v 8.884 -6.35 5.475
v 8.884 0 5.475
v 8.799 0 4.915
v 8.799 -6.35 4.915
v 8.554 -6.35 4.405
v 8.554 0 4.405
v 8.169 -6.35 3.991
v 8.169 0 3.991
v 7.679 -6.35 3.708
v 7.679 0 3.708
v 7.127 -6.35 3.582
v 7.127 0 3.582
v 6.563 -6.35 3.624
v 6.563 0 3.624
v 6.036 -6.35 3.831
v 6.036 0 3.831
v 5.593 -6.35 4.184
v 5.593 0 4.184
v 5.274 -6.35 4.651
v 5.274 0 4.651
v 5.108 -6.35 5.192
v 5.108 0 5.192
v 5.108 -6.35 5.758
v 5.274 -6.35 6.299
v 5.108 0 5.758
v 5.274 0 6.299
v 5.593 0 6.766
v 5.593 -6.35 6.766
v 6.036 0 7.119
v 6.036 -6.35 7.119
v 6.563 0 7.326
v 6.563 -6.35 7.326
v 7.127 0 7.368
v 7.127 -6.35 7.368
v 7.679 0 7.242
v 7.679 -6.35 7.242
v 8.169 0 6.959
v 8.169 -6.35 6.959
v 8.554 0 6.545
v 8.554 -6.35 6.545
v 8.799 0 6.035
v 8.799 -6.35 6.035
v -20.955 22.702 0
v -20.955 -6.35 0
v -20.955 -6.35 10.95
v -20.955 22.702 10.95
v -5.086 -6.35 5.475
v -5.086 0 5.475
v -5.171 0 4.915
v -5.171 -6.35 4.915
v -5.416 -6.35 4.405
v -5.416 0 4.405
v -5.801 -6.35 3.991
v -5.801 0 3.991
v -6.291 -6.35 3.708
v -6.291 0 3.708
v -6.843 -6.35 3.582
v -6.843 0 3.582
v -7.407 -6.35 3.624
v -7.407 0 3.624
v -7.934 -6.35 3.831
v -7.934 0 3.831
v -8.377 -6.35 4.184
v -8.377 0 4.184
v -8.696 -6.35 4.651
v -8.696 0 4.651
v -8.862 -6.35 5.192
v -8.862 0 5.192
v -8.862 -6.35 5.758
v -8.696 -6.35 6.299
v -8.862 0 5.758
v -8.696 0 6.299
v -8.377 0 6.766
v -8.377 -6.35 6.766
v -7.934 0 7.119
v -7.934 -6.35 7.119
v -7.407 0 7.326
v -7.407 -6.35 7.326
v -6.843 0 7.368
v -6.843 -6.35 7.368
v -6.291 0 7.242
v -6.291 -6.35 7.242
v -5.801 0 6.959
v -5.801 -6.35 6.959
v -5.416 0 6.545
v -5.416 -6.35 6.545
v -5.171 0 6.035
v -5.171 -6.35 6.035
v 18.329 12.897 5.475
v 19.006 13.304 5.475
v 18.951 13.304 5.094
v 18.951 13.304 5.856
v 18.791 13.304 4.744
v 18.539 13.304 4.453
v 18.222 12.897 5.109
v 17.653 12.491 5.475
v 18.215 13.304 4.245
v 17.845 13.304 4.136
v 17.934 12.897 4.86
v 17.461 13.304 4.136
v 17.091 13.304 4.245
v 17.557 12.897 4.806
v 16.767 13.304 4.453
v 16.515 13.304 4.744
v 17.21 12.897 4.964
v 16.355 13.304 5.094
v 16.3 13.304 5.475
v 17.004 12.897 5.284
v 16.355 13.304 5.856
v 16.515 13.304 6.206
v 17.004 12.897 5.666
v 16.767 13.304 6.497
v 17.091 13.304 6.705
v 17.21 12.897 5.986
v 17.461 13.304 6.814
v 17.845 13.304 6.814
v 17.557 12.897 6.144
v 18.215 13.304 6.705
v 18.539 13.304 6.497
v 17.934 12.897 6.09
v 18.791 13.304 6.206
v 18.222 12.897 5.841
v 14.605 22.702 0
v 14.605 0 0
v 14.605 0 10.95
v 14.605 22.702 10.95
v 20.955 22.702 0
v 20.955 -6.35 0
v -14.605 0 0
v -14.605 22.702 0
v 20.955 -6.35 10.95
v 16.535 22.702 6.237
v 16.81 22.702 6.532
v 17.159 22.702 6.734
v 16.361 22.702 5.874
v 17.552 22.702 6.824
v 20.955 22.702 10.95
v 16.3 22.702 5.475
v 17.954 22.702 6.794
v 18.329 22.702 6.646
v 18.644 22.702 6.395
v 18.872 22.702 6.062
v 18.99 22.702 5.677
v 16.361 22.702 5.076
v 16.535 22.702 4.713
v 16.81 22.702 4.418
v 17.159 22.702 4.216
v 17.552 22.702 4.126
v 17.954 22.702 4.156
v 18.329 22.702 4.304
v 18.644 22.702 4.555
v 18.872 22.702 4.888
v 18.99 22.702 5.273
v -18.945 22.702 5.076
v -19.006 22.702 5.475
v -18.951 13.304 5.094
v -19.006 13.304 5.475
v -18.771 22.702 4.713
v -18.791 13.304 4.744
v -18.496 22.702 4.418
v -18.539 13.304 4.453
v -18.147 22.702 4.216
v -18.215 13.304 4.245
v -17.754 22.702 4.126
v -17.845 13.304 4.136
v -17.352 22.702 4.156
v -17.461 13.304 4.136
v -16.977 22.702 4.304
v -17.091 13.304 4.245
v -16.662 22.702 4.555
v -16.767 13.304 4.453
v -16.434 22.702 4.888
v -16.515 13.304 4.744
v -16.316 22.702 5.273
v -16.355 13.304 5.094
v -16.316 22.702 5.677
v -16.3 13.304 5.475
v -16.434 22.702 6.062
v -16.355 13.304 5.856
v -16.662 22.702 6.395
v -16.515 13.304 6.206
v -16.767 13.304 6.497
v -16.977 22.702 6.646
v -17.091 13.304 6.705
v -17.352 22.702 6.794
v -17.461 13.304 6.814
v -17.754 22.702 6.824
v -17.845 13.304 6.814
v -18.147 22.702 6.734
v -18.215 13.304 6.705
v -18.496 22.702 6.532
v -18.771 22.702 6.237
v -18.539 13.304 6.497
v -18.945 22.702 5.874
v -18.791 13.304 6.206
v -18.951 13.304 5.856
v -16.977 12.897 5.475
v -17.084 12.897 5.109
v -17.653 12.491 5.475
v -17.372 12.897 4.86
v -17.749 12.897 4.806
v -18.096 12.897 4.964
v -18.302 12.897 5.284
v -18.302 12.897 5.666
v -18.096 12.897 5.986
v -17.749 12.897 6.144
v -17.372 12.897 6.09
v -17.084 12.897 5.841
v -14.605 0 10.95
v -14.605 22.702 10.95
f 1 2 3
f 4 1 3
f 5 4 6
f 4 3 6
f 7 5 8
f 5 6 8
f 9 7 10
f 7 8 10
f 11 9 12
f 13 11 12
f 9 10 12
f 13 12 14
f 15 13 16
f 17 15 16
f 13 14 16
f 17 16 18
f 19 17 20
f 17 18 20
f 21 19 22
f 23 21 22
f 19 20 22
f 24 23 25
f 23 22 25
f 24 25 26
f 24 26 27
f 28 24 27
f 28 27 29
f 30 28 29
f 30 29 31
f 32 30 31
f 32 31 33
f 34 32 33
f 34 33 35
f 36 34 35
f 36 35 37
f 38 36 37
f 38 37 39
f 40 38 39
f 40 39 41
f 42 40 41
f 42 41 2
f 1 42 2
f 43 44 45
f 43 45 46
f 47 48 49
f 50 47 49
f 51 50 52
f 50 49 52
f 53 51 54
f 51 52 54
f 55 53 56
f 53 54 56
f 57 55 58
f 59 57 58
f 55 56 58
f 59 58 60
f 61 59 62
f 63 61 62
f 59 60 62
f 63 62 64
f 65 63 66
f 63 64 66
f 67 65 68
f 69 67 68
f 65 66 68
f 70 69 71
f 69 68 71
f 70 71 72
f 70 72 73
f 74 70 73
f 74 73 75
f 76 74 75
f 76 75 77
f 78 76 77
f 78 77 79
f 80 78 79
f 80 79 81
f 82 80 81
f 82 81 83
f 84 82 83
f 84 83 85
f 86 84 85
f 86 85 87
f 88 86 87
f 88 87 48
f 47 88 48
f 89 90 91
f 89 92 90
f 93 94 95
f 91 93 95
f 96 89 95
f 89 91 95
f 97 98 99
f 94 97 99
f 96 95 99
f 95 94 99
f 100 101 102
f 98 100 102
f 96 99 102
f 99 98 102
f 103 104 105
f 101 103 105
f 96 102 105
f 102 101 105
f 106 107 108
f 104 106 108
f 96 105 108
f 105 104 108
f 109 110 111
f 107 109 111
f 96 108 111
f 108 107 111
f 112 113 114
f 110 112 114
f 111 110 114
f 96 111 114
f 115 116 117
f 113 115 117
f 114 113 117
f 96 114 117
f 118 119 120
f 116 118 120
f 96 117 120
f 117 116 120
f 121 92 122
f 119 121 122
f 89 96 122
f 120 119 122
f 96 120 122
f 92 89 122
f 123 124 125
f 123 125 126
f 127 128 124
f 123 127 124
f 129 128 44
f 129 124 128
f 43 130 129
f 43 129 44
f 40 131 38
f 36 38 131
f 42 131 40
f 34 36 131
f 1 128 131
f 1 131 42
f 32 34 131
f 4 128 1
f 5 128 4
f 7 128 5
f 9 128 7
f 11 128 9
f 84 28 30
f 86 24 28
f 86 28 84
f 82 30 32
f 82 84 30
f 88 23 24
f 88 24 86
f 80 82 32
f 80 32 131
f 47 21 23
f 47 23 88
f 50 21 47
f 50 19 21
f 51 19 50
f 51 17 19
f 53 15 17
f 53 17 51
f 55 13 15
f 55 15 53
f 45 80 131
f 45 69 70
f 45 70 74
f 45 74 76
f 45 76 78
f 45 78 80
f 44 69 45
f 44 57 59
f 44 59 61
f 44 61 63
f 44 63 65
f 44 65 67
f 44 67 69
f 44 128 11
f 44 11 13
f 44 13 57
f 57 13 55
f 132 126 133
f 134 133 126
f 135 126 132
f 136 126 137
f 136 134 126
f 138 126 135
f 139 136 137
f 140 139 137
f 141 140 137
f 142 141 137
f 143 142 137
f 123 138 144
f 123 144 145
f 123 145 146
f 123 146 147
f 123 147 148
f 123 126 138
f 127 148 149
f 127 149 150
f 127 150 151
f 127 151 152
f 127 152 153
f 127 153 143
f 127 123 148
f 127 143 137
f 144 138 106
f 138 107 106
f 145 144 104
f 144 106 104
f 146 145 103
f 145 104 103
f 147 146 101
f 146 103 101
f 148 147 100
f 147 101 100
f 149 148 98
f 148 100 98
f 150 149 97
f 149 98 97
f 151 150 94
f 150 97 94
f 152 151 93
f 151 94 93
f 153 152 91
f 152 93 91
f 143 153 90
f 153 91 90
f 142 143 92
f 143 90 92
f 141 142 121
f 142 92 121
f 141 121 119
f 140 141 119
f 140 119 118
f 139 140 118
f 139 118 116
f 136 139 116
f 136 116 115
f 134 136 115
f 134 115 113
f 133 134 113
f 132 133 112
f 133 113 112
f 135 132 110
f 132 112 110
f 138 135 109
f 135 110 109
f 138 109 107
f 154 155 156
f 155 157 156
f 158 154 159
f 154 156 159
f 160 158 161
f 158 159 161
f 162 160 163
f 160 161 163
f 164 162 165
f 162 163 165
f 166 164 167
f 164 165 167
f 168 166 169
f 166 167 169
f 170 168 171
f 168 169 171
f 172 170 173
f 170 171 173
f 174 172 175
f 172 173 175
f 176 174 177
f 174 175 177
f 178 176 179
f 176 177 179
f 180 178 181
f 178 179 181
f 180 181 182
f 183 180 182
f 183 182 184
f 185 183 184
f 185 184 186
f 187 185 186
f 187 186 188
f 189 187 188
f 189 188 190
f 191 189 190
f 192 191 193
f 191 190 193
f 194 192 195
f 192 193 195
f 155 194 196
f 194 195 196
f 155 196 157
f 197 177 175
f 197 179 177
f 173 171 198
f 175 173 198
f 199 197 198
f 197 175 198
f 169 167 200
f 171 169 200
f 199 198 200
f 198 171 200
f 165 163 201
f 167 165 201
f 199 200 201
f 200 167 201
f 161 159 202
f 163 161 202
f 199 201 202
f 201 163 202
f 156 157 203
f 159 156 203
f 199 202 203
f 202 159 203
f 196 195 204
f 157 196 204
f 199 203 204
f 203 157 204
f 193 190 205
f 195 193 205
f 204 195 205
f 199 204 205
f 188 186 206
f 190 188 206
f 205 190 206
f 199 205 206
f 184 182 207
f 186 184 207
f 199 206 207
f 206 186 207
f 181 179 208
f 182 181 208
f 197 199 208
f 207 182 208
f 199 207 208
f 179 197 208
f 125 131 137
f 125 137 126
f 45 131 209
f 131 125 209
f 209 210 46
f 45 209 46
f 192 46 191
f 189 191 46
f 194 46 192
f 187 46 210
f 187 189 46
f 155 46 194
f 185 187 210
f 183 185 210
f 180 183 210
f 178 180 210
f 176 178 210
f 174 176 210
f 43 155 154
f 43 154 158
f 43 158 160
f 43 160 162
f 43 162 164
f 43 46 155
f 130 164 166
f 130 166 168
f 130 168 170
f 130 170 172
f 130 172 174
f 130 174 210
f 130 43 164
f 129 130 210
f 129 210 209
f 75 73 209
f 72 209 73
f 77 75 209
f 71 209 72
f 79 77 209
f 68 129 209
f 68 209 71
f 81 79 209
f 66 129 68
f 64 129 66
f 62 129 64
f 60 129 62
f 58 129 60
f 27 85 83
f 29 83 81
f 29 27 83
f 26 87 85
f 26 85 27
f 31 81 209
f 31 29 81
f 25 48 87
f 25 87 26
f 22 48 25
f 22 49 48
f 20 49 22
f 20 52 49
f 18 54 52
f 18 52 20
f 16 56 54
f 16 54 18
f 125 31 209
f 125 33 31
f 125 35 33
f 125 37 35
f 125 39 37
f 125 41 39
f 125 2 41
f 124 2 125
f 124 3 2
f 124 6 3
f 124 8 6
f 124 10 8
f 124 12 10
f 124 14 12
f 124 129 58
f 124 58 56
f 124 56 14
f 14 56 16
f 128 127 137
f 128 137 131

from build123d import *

# Parameters (mm, degrees)
BOSS_EXTRUDE1_DEPTH       = 10.95
F_6_CLEARANCE_HOLE1_D     = 3.7973
F_6_32_TAPPED_HOLE1_D     = 2.7051
F_6_32_TAPPED_HOLE1_DEPTH = 9.398
F_6_32_TAPPED_HOLE1_TIP   = 0.81269403


with BuildPart() as part:
    # Sketch1 → Boss-Extrude1 (new body)
    with BuildSketch(Plane.XY):
        Polygon((-20.955, 22.701840042), (-14.605, 22.701840042), (-14.605, 0), (14.605, 0), (14.605, 22.701840042), (20.955, 22.701840042), (20.955, -6.35), (-20.955, -6.35), align=None)
    extrude(amount=BOSS_EXTRUDE1_DEPTH)

    # #6 Clearance Hole1 (through all)
    with Locations(Plane(origin=(0, -6.35, 0), x_dir=(-1, 0, 0), z_dir=(0, -1, 0))):
        with Locations((-6.985, -5.475), (6.985, -5.475)):
            Hole(F_6_CLEARANCE_HOLE1_D / 2)

    # #6-32 Tapped Hole1
    with Locations(Plane(origin=(0, 22.701840042, 0), x_dir=(1, 0, 0), z_dir=(0, 1, 0))):
        with Locations((17.653, -5.475), (-17.653, -5.475)):
            Hole(F_6_32_TAPPED_HOLE1_D / 2, depth=F_6_32_TAPPED_HOLE1_DEPTH)
            with Locations((0, 0, -(F_6_32_TAPPED_HOLE1_DEPTH + F_6_32_TAPPED_HOLE1_TIP / 2))):  # 118° drill point
                Cone(0, F_6_32_TAPPED_HOLE1_D / 2, F_6_32_TAPPED_HOLE1_TIP, mode=Mode.SUBTRACT)


solid = part.part
